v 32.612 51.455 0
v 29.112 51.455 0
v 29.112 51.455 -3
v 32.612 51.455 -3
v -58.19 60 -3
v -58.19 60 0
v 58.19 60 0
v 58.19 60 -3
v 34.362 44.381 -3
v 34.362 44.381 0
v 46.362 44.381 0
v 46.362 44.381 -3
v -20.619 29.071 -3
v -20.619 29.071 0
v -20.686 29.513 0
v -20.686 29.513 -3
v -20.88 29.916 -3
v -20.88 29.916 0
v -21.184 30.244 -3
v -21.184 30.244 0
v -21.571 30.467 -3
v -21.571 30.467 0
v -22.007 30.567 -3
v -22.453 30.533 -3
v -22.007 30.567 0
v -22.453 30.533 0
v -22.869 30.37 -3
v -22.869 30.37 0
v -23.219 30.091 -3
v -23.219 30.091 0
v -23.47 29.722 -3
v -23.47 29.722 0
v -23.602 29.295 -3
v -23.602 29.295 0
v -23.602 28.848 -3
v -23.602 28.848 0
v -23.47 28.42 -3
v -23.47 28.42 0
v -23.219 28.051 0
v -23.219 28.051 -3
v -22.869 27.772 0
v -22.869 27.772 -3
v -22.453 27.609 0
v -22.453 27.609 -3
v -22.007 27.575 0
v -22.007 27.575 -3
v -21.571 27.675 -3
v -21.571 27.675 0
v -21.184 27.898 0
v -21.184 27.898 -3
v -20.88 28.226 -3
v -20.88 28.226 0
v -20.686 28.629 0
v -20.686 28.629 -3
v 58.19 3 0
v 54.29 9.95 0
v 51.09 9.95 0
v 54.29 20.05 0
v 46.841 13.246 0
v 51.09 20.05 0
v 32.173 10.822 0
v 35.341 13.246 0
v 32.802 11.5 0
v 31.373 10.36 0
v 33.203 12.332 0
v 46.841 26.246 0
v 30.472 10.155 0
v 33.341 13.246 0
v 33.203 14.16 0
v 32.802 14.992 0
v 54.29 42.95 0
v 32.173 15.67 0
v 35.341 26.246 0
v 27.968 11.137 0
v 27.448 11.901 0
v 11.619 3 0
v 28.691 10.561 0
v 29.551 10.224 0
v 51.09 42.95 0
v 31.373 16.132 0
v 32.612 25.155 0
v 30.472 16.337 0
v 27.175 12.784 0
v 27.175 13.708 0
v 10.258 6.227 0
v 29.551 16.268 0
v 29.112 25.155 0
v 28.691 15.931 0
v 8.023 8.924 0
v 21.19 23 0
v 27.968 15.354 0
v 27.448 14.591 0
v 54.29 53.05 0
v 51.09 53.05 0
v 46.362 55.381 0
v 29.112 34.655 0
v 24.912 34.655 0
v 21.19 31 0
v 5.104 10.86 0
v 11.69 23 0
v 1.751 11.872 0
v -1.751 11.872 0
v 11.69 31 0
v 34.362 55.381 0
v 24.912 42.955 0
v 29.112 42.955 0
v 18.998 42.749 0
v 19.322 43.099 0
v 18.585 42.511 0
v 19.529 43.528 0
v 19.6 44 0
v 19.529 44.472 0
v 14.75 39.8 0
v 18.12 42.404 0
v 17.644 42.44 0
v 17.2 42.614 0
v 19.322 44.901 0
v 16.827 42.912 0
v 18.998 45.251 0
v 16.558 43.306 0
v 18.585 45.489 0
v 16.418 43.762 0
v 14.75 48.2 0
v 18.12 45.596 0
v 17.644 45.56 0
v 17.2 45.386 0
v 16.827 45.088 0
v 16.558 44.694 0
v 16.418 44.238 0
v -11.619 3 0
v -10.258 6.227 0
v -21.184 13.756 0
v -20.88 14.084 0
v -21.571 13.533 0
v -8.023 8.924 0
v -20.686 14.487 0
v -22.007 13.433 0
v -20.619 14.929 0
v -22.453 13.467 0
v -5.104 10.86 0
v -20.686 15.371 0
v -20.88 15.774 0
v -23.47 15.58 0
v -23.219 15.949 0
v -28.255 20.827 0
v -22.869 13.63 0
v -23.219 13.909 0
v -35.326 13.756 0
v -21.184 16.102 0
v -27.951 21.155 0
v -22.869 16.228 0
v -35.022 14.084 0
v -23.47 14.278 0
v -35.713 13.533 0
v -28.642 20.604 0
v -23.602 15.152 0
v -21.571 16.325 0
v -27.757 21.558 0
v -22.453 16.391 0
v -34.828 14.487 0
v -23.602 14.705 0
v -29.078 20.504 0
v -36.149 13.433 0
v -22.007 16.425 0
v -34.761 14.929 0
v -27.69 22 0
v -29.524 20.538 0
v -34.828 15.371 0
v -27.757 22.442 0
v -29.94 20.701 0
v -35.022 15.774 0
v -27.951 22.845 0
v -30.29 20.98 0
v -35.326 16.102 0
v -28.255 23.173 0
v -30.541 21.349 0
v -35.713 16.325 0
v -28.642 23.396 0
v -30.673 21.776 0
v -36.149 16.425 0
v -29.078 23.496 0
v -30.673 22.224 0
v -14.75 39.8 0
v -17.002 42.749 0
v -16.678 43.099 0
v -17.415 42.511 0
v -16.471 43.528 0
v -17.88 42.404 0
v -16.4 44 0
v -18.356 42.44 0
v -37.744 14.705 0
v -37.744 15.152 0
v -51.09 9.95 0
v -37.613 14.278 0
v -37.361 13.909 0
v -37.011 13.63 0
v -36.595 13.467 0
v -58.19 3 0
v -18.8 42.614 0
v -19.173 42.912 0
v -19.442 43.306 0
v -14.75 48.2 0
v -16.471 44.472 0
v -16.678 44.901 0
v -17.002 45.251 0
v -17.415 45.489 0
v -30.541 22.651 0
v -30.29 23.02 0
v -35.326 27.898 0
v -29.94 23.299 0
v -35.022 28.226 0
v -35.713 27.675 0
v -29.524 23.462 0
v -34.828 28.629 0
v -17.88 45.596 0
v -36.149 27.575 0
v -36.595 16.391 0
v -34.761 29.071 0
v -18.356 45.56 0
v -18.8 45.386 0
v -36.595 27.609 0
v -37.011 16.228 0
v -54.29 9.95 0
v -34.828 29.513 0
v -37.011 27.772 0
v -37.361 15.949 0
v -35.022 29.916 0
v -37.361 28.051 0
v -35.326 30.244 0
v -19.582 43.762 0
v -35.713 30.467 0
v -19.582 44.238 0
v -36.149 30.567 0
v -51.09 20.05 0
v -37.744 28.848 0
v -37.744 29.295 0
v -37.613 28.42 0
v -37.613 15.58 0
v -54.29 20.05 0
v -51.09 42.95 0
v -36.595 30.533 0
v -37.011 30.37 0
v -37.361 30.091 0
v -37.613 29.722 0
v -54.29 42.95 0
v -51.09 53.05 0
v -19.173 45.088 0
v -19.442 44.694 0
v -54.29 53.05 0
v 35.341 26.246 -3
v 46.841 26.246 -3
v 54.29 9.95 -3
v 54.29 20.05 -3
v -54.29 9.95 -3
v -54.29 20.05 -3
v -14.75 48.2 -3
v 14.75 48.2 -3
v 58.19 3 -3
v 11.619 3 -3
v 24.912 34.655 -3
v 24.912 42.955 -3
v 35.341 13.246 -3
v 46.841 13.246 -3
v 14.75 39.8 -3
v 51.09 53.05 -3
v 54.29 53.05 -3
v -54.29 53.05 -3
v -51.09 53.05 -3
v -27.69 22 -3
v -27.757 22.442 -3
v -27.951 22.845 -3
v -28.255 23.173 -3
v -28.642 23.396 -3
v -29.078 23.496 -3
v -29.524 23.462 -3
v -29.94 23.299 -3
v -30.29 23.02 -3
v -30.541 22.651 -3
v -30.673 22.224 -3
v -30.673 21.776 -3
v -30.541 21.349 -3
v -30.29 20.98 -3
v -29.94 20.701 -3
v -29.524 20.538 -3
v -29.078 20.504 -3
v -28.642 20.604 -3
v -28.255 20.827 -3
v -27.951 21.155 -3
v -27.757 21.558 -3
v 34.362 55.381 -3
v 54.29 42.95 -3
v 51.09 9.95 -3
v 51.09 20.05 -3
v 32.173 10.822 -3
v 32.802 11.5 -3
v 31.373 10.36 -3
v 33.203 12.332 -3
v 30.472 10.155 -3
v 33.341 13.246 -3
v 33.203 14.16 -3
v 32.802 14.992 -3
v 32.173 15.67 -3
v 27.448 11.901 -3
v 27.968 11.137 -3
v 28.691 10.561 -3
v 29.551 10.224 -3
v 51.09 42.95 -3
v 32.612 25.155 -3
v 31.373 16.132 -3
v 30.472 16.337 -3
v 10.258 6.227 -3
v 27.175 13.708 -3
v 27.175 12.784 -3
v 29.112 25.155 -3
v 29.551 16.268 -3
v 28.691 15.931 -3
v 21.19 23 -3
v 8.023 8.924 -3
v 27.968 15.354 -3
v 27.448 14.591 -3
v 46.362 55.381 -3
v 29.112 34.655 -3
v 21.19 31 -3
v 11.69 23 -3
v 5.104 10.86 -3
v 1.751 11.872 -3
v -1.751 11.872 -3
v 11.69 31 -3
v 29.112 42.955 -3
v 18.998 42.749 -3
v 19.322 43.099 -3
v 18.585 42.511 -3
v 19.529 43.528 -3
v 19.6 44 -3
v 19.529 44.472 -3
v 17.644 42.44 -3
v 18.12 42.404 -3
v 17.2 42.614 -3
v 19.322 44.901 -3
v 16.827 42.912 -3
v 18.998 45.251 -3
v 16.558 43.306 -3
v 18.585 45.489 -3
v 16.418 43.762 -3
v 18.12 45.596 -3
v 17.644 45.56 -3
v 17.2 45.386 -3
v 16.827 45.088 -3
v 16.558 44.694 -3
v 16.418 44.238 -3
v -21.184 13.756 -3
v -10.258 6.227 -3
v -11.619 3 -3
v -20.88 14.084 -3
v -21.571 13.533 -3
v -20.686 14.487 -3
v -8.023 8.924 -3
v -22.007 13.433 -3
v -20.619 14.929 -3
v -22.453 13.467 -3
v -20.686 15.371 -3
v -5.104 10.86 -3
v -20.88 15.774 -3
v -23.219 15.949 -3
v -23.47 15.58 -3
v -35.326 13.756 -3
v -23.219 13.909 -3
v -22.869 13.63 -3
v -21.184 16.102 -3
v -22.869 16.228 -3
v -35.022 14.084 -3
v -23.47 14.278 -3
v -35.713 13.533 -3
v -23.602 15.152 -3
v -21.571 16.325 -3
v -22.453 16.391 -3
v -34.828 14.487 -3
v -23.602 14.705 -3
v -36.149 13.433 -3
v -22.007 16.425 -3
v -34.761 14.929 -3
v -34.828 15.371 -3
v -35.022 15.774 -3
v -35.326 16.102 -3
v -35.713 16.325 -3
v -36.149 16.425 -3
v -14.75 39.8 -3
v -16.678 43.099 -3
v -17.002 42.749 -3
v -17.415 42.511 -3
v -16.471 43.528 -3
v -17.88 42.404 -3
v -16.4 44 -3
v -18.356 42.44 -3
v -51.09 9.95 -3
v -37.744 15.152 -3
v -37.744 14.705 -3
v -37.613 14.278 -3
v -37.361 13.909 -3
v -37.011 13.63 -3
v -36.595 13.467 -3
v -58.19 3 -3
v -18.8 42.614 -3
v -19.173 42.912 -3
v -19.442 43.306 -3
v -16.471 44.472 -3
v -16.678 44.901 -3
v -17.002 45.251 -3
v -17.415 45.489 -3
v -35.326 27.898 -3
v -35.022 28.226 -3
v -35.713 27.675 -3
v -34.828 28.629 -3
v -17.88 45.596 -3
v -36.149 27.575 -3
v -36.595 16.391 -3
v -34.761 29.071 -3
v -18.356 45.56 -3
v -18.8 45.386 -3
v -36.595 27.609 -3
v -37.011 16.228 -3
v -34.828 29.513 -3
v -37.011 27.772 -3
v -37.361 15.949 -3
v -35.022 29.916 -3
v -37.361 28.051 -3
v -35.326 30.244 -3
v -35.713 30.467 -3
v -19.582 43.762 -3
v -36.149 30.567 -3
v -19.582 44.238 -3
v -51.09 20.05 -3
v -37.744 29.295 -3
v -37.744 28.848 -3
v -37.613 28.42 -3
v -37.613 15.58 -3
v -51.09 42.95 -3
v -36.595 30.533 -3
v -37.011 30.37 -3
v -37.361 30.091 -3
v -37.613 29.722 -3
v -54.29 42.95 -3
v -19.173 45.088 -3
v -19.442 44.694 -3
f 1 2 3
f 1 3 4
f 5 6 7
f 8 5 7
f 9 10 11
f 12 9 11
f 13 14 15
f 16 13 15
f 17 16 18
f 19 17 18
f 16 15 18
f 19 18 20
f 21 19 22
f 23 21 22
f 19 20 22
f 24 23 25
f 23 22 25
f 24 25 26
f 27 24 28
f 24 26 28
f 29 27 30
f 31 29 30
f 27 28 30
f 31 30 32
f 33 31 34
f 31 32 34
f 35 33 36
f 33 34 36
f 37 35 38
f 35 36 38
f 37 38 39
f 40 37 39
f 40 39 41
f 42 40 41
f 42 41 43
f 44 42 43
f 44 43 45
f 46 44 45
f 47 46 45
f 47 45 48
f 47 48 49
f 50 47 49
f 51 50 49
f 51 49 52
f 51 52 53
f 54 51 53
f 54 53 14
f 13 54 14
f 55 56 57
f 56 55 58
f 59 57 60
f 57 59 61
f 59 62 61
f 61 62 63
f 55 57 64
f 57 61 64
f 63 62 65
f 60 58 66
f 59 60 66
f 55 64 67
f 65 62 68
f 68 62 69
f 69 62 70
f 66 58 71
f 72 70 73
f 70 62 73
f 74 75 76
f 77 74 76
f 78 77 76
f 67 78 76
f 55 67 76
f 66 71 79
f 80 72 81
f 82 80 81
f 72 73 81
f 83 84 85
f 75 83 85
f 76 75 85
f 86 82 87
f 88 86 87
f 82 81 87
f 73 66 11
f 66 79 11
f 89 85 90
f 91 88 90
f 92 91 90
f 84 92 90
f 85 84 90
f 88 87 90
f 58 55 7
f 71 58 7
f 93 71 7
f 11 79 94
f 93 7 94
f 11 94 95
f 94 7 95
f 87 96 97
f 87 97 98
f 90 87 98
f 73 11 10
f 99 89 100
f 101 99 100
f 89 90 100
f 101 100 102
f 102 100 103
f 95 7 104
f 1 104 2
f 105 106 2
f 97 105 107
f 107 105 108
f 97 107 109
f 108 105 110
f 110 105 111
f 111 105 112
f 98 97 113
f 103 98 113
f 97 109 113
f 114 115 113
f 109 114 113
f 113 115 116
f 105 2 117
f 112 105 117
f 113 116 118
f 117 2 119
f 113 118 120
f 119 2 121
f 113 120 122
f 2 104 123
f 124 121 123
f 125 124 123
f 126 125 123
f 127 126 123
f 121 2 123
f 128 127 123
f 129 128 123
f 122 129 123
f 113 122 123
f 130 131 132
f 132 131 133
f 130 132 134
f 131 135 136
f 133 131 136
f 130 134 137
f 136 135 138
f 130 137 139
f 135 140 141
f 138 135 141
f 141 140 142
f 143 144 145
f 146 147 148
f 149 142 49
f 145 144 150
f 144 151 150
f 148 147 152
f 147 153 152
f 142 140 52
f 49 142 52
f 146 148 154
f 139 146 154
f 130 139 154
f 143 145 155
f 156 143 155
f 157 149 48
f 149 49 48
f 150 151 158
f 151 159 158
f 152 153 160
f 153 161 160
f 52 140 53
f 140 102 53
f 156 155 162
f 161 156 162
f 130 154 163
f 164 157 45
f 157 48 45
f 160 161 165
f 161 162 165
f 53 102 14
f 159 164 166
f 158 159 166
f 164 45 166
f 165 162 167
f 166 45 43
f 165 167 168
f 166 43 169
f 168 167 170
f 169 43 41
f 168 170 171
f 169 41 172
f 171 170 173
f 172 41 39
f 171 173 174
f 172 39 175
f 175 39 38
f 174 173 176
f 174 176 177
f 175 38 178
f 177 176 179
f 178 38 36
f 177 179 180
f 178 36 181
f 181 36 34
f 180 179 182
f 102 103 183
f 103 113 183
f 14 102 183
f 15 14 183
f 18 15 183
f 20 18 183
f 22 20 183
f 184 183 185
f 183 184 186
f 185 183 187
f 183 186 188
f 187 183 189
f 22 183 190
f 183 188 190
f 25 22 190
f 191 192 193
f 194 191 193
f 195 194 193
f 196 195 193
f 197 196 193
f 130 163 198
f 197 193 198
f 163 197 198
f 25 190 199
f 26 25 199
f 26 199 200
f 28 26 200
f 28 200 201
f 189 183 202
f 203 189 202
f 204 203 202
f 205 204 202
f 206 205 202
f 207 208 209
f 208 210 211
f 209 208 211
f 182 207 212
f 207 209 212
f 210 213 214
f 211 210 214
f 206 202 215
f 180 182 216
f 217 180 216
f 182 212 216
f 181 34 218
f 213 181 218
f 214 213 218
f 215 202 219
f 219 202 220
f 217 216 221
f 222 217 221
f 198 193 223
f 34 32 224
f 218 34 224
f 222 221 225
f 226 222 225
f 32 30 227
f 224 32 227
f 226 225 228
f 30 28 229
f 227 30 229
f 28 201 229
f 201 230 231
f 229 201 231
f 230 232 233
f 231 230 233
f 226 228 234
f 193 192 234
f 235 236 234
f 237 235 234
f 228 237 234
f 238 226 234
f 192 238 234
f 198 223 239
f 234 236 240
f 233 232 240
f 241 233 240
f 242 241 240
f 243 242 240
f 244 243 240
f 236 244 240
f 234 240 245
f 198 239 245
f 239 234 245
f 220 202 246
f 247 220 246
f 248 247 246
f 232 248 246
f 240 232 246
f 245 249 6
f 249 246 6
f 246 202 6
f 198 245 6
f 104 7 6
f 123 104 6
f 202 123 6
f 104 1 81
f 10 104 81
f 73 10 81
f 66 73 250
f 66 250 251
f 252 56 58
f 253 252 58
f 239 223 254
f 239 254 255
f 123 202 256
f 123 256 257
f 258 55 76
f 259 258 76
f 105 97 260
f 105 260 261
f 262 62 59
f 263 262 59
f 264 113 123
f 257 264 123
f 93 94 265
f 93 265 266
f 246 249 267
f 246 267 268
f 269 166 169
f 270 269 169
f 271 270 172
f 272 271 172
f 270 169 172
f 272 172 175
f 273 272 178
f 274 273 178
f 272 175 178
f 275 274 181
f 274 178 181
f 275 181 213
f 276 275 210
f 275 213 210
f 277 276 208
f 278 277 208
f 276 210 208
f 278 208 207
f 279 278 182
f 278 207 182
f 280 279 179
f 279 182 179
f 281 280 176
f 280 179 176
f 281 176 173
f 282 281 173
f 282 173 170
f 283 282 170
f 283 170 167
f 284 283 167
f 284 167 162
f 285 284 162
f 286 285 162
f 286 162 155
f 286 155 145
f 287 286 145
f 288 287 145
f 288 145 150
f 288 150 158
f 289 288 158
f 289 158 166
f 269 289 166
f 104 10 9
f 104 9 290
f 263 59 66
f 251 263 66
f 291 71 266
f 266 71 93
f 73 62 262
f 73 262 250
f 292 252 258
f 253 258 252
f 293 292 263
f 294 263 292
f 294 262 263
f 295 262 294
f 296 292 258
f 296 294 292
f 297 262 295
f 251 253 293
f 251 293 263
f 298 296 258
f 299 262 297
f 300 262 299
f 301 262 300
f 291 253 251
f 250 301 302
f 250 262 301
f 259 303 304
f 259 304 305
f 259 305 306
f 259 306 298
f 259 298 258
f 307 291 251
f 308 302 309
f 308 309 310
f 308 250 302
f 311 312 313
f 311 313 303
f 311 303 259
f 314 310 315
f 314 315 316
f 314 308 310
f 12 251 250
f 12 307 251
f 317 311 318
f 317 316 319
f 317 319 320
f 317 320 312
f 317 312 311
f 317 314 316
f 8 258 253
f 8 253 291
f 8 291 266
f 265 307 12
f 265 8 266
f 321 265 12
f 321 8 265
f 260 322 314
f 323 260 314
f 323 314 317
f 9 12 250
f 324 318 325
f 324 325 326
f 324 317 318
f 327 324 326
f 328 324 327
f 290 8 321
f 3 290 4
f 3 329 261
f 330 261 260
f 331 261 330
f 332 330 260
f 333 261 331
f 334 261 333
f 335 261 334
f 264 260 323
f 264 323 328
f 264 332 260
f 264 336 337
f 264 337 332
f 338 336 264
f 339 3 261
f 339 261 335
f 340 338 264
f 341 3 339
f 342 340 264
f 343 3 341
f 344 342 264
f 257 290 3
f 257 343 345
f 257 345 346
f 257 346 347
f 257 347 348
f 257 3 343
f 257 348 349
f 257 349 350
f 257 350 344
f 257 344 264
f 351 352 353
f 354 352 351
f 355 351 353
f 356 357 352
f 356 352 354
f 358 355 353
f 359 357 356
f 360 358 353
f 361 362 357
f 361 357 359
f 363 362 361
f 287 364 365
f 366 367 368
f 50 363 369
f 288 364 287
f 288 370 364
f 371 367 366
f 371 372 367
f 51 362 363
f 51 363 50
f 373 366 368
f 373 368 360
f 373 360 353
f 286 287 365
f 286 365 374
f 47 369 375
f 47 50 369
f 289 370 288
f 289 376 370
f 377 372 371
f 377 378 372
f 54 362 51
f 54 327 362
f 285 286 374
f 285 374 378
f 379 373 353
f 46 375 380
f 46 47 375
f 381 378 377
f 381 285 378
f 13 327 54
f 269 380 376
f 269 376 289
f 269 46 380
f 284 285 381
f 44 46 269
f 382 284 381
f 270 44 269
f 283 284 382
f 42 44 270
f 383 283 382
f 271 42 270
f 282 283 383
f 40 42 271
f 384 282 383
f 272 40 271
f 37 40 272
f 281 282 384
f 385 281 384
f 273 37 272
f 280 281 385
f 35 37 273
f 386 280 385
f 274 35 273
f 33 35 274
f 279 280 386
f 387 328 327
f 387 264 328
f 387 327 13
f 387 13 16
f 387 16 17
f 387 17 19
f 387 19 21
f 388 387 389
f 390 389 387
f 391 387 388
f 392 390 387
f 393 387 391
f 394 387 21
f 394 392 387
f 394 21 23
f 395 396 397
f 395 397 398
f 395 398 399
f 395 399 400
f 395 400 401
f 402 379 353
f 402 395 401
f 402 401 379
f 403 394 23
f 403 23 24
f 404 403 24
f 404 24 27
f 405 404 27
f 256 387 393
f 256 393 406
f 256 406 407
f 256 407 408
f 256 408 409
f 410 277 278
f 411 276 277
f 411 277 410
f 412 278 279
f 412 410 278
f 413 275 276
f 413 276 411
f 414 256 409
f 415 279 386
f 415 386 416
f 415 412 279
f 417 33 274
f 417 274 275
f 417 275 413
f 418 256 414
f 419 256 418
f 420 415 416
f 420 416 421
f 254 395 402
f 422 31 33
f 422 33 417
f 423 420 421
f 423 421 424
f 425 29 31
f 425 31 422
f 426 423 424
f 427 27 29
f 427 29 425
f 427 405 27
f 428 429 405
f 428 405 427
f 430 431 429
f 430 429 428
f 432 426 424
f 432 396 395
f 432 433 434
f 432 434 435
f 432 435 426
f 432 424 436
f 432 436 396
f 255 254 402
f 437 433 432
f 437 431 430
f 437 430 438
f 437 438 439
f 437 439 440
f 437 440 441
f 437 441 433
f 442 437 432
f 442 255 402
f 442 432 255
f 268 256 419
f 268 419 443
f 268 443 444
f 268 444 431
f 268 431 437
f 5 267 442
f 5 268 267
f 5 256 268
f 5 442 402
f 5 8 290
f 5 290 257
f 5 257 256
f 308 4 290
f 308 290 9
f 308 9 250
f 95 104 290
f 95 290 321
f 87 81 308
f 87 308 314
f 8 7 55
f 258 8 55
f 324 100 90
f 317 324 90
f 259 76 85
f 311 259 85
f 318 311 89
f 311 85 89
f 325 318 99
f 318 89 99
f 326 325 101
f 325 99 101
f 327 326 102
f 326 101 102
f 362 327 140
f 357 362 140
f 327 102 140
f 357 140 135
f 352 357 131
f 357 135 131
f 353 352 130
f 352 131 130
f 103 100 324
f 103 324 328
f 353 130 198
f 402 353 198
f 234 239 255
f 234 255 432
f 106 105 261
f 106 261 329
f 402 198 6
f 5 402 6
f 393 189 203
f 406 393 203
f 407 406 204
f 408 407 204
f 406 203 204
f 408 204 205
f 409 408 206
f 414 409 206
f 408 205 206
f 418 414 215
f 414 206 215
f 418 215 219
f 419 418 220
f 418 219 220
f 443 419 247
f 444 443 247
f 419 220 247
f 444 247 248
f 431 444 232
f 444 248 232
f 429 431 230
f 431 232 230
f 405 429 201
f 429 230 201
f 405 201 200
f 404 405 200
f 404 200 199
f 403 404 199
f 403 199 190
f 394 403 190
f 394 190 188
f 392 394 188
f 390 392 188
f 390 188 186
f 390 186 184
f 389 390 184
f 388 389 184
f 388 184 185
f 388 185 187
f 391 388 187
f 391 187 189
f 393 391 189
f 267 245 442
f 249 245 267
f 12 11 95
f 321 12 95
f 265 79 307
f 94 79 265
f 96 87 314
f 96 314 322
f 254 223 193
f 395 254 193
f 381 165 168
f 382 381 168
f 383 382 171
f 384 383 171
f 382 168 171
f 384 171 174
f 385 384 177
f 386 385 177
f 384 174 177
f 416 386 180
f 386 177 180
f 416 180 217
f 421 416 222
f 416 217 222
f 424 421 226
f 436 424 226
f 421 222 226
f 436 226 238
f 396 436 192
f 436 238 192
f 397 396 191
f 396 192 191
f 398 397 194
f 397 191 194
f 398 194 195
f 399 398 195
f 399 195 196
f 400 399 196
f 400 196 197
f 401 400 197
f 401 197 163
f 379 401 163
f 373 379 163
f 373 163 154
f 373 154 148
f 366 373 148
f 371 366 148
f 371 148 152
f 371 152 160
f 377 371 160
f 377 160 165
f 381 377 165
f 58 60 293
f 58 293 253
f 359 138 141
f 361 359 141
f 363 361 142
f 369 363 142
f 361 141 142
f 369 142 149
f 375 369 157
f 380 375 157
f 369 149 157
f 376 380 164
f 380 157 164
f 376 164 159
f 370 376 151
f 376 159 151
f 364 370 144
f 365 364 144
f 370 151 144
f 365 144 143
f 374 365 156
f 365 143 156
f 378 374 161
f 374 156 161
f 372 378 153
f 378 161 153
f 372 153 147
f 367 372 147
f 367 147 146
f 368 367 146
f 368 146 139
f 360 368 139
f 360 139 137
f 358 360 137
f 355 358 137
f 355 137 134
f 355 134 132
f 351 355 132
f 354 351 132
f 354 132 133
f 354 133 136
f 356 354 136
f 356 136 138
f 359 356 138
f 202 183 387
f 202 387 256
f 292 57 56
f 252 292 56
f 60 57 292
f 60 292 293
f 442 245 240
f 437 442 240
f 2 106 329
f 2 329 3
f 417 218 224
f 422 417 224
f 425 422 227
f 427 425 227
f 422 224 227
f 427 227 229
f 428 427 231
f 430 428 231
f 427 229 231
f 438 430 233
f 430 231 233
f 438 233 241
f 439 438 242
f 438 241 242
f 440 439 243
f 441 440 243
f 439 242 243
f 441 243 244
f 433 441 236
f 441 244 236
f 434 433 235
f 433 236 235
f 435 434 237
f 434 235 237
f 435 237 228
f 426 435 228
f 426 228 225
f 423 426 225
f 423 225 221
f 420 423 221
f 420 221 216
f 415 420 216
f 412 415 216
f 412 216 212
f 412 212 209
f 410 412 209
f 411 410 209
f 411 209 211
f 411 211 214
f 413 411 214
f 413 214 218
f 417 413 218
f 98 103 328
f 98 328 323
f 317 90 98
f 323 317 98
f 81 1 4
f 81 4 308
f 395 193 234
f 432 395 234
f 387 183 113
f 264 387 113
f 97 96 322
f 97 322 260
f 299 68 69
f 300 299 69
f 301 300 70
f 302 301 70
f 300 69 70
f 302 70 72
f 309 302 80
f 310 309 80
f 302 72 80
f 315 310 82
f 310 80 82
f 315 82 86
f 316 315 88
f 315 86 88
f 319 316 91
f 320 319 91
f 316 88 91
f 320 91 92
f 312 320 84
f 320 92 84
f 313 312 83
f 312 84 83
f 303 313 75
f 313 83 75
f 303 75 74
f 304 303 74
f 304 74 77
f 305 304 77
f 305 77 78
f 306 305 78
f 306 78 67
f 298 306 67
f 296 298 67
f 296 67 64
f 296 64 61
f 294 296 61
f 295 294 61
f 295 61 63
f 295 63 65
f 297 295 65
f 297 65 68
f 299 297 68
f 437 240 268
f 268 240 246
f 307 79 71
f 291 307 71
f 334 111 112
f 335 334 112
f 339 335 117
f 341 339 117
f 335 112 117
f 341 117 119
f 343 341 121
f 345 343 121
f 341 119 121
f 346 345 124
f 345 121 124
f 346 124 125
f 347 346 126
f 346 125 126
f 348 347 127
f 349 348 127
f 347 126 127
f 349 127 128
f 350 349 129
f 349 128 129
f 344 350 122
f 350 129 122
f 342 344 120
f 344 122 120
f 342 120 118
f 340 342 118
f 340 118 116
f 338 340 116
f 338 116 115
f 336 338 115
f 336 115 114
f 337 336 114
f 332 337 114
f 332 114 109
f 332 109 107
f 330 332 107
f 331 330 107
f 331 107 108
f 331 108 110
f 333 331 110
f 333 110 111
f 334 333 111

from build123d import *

# Parameters (mm, degrees)
SKETCH1_W                   = 3.2
SKETCH1_H                   = 10.1
BOSS_EXTRUDE1_DEPTH         = 3
SENSOR_MOUNTING_HOLES_REACH = 85.637
SKETCH2_R                   = 1.6
SKETCH2_R_2                 = 1.5
SKETCH2_R_3                 = 3.1
SKETCH2_W                   = 9.5
SKETCH2_H                   = 8
SKETCH2_W_2                 = 29.5
SKETCH2_H_2                 = 8.4
SKETCH2_W_3                 = 11.5
SKETCH2_H_3                 = 13
SKETCH2_W_4                 = 12
SKETCH2_H_4                 = 11


with BuildPart() as part:
    # Sketch1 → Boss-Extrude1 (new body)
    with BuildSketch(Plane.XY):
        with BuildLine():
            Line((-58.19, 60), (58.19, 60))
            Line((58.19, 60), (58.19, 3))
            Line((58.19, 3), (11.618950039, 3))
            ThreePointArc((11.618950039, 3), (0, 12), (-11.618950039, 3))
            Line((-11.618950039, 3), (-58.19, 3))
            Line((-58.19, 3), (-58.19, 60))
        make_face()
        with Locations((-52.69, 15)):
            Rectangle(SKETCH1_W, SKETCH1_H, mode=Mode.SUBTRACT)
        with Locations((-52.69, 48)):
            Rectangle(SKETCH1_W, SKETCH1_H, mode=Mode.SUBTRACT)
        with Locations((52.69, 15)):
            Rectangle(SKETCH1_W, SKETCH1_H, mode=Mode.SUBTRACT)
        with Locations((52.69, 48)):
            Rectangle(SKETCH1_W, SKETCH1_H, mode=Mode.SUBTRACT)
    extrude(amount=-BOSS_EXTRUDE1_DEPTH)

    # Sketch2 (on Front Plane) → sensor mounting holes (cut, up to next)
    with BuildSketch(Plane.XY, mode=Mode.PRIVATE) as sensor_mounting_holes_sk1:
        with Locations((-18, 44)):
            Circle(SKETCH2_R)
    sensor_mounting_holes_tool1 = extrude(sensor_mounting_holes_sk1.sketch, amount=-SENSOR_MOUNTING_HOLES_REACH, mode=Mode.PRIVATE) & part.part
    # Sketch2 (on Front Plane) → sensor mounting holes (cut, up to next)
    with BuildSketch(Plane.XY, mode=Mode.PRIVATE) as sensor_mounting_holes_sk2:
        with Locations((18, 44)):
            Circle(SKETCH2_R)
    sensor_mounting_holes_tool2 = extrude(sensor_mounting_holes_sk2.sketch, amount=-SENSOR_MOUNTING_HOLES_REACH, mode=Mode.PRIVATE) & part.part
    # Sketch2 (on Front Plane) → sensor mounting holes (cut, up to next)
    with BuildSketch(Plane.XY, mode=Mode.PRIVATE) as sensor_mounting_holes_sk3:
        with Locations((-22.118932188, 29.071067812)):
            Circle(SKETCH2_R_2)
    sensor_mounting_holes_tool3 = extrude(sensor_mounting_holes_sk3.sketch, amount=-SENSOR_MOUNTING_HOLES_REACH, mode=Mode.PRIVATE) & part.part
    # Sketch2 (on Front Plane) → sensor mounting holes (cut, up to next)
    with BuildSketch(Plane.XY, mode=Mode.PRIVATE) as sensor_mounting_holes_sk4:
        with Locations((-36.261067812, 29.071067812)):
            Circle(SKETCH2_R_2)
    sensor_mounting_holes_tool4 = extrude(sensor_mounting_holes_sk4.sketch, amount=-SENSOR_MOUNTING_HOLES_REACH, mode=Mode.PRIVATE) & part.part
    # Sketch2 (on Front Plane) → sensor mounting holes (cut, up to next)
    with BuildSketch(Plane.XY, mode=Mode.PRIVATE) as sensor_mounting_holes_sk5:
        with Locations((-36.261067812, 14.928932188)):
            Circle(SKETCH2_R_2)
    sensor_mounting_holes_tool5 = extrude(sensor_mounting_holes_sk5.sketch, amount=-SENSOR_MOUNTING_HOLES_REACH, mode=Mode.PRIVATE) & part.part
    # Sketch2 (on Front Plane) → sensor mounting holes (cut, up to next)
    with BuildSketch(Plane.XY, mode=Mode.PRIVATE) as sensor_mounting_holes_sk6:
        with Locations((-22.118932188, 14.928932188)):
            Circle(SKETCH2_R_2)
    sensor_mounting_holes_tool6 = extrude(sensor_mounting_holes_sk6.sketch, amount=-SENSOR_MOUNTING_HOLES_REACH, mode=Mode.PRIVATE) & part.part
    # Sketch2 (on Front Plane) → sensor mounting holes (cut, up to next)
    with BuildSketch(Plane.XY, mode=Mode.PRIVATE) as sensor_mounting_holes_sk7:
        with Locations((-29.19, 22)):
            Circle(SKETCH2_R_2)
    sensor_mounting_holes_tool7 = extrude(sensor_mounting_holes_sk7.sketch, amount=-SENSOR_MOUNTING_HOLES_REACH, mode=Mode.PRIVATE) & part.part
    # Sketch2 (on Front Plane) → sensor mounting holes (cut, up to next)
    with BuildSketch(Plane.XY, mode=Mode.PRIVATE) as sensor_mounting_holes_sk8:
        with Locations((30.240588995, 13.245945843)):
            Circle(SKETCH2_R_3)
    sensor_mounting_holes_tool8 = extrude(sensor_mounting_holes_sk8.sketch, amount=-SENSOR_MOUNTING_HOLES_REACH, mode=Mode.PRIVATE) & part.part
    # Sketch2 (on Front Plane) → sensor mounting holes (cut, up to next)
    with BuildSketch(Plane.XY, mode=Mode.PRIVATE) as sensor_mounting_holes_sk9:
        with Locations((16.44, 27)):
            Rectangle(SKETCH2_W, SKETCH2_H)
    sensor_mounting_holes_tool9 = extrude(sensor_mounting_holes_sk9.sketch, amount=-SENSOR_MOUNTING_HOLES_REACH, mode=Mode.PRIVATE) & part.part
    # Sketch2 (on Front Plane) → sensor mounting holes (cut, up to next)
    with BuildSketch(Plane.XY, mode=Mode.PRIVATE) as sensor_mounting_holes_sk10:
        with Locations((0, 44)):
            Rectangle(SKETCH2_W_2, SKETCH2_H_2)
    sensor_mounting_holes_tool10 = extrude(sensor_mounting_holes_sk10.sketch, amount=-SENSOR_MOUNTING_HOLES_REACH, mode=Mode.PRIVATE) & part.part
    # Sketch2 (on Front Plane) → sensor mounting holes (cut, up to next)
    with BuildSketch(Plane.XY, mode=Mode.PRIVATE) as sensor_mounting_holes_sk11:
        Polygon((24.912246381, 42.955051143), (29.112246381, 42.955051143), (29.112246381, 51.455051143), (32.612246381, 51.455051143), (32.612246381, 25.155051143), (29.112246381, 25.155051143), (29.112246381, 34.655051143), (24.912246381, 34.655051143), align=None)
    sensor_mounting_holes_tool11 = extrude(sensor_mounting_holes_sk11.sketch, amount=-SENSOR_MOUNTING_HOLES_REACH, mode=Mode.PRIVATE) & part.part
    # Sketch2 (on Front Plane) → sensor mounting holes (cut, up to next)
    with BuildSketch(Plane.XY, mode=Mode.PRIVATE) as sensor_mounting_holes_sk12:
        with Locations((41.090588995, 19.745945843)):
            Rectangle(SKETCH2_W_3, SKETCH2_H_3)
    sensor_mounting_holes_tool12 = extrude(sensor_mounting_holes_sk12.sketch, amount=-SENSOR_MOUNTING_HOLES_REACH, mode=Mode.PRIVATE) & part.part
    # Sketch2 (on Front Plane) → sensor mounting holes (cut, up to next)
    with BuildSketch(Plane.XY, mode=Mode.PRIVATE) as sensor_mounting_holes_sk13:
        with Locations((40.362246381, 49.88070744)):
            Rectangle(SKETCH2_W_4, SKETCH2_H_4)
    sensor_mounting_holes_tool13 = extrude(sensor_mounting_holes_sk13.sketch, amount=-SENSOR_MOUNTING_HOLES_REACH, mode=Mode.PRIVATE) & part.part
    add(sensor_mounting_holes_tool1.solids().sort_by_distance((-18, 44, 0))[0], mode=Mode.SUBTRACT)
    add(sensor_mounting_holes_tool2.solids().sort_by_distance((18, 44, 0))[0], mode=Mode.SUBTRACT)
    add(sensor_mounting_holes_tool3.solids().sort_by_distance((-22.118932, 29.071068, 0))[0], mode=Mode.SUBTRACT)
    add(sensor_mounting_holes_tool4.solids().sort_by_distance((-36.261068, 29.071068, 0))[0], mode=Mode.SUBTRACT)
    add(sensor_mounting_holes_tool5.solids().sort_by_distance((-36.261068, 14.928932, 0))[0], mode=Mode.SUBTRACT)
    add(sensor_mounting_holes_tool6.solids().sort_by_distance((-22.118932, 14.928932, 0))[0], mode=Mode.SUBTRACT)
    add(sensor_mounting_holes_tool7.solids().sort_by_distance((-29.19, 22, 0))[0], mode=Mode.SUBTRACT)
    add(sensor_mounting_holes_tool8.solids().sort_by_distance((30.240589, 13.245946, 0))[0], mode=Mode.SUBTRACT)
    add(sensor_mounting_holes_tool9.solids().sort_by_distance((16.44, 27, 0))[0], mode=Mode.SUBTRACT)
    add(sensor_mounting_holes_tool10.solids().sort_by_distance((0, 44, 0))[0], mode=Mode.SUBTRACT)
    add(sensor_mounting_holes_tool11.solids().sort_by_distance((29.804717, 38.442393, 0))[0], mode=Mode.SUBTRACT)
    add(sensor_mounting_holes_tool12.solids().sort_by_distance((41.090589, 19.745946, 0))[0], mode=Mode.SUBTRACT)
    add(sensor_mounting_holes_tool13.solids().sort_by_distance((40.362246, 49.880707, 0))[0], mode=Mode.SUBTRACT)


solid = part.part
